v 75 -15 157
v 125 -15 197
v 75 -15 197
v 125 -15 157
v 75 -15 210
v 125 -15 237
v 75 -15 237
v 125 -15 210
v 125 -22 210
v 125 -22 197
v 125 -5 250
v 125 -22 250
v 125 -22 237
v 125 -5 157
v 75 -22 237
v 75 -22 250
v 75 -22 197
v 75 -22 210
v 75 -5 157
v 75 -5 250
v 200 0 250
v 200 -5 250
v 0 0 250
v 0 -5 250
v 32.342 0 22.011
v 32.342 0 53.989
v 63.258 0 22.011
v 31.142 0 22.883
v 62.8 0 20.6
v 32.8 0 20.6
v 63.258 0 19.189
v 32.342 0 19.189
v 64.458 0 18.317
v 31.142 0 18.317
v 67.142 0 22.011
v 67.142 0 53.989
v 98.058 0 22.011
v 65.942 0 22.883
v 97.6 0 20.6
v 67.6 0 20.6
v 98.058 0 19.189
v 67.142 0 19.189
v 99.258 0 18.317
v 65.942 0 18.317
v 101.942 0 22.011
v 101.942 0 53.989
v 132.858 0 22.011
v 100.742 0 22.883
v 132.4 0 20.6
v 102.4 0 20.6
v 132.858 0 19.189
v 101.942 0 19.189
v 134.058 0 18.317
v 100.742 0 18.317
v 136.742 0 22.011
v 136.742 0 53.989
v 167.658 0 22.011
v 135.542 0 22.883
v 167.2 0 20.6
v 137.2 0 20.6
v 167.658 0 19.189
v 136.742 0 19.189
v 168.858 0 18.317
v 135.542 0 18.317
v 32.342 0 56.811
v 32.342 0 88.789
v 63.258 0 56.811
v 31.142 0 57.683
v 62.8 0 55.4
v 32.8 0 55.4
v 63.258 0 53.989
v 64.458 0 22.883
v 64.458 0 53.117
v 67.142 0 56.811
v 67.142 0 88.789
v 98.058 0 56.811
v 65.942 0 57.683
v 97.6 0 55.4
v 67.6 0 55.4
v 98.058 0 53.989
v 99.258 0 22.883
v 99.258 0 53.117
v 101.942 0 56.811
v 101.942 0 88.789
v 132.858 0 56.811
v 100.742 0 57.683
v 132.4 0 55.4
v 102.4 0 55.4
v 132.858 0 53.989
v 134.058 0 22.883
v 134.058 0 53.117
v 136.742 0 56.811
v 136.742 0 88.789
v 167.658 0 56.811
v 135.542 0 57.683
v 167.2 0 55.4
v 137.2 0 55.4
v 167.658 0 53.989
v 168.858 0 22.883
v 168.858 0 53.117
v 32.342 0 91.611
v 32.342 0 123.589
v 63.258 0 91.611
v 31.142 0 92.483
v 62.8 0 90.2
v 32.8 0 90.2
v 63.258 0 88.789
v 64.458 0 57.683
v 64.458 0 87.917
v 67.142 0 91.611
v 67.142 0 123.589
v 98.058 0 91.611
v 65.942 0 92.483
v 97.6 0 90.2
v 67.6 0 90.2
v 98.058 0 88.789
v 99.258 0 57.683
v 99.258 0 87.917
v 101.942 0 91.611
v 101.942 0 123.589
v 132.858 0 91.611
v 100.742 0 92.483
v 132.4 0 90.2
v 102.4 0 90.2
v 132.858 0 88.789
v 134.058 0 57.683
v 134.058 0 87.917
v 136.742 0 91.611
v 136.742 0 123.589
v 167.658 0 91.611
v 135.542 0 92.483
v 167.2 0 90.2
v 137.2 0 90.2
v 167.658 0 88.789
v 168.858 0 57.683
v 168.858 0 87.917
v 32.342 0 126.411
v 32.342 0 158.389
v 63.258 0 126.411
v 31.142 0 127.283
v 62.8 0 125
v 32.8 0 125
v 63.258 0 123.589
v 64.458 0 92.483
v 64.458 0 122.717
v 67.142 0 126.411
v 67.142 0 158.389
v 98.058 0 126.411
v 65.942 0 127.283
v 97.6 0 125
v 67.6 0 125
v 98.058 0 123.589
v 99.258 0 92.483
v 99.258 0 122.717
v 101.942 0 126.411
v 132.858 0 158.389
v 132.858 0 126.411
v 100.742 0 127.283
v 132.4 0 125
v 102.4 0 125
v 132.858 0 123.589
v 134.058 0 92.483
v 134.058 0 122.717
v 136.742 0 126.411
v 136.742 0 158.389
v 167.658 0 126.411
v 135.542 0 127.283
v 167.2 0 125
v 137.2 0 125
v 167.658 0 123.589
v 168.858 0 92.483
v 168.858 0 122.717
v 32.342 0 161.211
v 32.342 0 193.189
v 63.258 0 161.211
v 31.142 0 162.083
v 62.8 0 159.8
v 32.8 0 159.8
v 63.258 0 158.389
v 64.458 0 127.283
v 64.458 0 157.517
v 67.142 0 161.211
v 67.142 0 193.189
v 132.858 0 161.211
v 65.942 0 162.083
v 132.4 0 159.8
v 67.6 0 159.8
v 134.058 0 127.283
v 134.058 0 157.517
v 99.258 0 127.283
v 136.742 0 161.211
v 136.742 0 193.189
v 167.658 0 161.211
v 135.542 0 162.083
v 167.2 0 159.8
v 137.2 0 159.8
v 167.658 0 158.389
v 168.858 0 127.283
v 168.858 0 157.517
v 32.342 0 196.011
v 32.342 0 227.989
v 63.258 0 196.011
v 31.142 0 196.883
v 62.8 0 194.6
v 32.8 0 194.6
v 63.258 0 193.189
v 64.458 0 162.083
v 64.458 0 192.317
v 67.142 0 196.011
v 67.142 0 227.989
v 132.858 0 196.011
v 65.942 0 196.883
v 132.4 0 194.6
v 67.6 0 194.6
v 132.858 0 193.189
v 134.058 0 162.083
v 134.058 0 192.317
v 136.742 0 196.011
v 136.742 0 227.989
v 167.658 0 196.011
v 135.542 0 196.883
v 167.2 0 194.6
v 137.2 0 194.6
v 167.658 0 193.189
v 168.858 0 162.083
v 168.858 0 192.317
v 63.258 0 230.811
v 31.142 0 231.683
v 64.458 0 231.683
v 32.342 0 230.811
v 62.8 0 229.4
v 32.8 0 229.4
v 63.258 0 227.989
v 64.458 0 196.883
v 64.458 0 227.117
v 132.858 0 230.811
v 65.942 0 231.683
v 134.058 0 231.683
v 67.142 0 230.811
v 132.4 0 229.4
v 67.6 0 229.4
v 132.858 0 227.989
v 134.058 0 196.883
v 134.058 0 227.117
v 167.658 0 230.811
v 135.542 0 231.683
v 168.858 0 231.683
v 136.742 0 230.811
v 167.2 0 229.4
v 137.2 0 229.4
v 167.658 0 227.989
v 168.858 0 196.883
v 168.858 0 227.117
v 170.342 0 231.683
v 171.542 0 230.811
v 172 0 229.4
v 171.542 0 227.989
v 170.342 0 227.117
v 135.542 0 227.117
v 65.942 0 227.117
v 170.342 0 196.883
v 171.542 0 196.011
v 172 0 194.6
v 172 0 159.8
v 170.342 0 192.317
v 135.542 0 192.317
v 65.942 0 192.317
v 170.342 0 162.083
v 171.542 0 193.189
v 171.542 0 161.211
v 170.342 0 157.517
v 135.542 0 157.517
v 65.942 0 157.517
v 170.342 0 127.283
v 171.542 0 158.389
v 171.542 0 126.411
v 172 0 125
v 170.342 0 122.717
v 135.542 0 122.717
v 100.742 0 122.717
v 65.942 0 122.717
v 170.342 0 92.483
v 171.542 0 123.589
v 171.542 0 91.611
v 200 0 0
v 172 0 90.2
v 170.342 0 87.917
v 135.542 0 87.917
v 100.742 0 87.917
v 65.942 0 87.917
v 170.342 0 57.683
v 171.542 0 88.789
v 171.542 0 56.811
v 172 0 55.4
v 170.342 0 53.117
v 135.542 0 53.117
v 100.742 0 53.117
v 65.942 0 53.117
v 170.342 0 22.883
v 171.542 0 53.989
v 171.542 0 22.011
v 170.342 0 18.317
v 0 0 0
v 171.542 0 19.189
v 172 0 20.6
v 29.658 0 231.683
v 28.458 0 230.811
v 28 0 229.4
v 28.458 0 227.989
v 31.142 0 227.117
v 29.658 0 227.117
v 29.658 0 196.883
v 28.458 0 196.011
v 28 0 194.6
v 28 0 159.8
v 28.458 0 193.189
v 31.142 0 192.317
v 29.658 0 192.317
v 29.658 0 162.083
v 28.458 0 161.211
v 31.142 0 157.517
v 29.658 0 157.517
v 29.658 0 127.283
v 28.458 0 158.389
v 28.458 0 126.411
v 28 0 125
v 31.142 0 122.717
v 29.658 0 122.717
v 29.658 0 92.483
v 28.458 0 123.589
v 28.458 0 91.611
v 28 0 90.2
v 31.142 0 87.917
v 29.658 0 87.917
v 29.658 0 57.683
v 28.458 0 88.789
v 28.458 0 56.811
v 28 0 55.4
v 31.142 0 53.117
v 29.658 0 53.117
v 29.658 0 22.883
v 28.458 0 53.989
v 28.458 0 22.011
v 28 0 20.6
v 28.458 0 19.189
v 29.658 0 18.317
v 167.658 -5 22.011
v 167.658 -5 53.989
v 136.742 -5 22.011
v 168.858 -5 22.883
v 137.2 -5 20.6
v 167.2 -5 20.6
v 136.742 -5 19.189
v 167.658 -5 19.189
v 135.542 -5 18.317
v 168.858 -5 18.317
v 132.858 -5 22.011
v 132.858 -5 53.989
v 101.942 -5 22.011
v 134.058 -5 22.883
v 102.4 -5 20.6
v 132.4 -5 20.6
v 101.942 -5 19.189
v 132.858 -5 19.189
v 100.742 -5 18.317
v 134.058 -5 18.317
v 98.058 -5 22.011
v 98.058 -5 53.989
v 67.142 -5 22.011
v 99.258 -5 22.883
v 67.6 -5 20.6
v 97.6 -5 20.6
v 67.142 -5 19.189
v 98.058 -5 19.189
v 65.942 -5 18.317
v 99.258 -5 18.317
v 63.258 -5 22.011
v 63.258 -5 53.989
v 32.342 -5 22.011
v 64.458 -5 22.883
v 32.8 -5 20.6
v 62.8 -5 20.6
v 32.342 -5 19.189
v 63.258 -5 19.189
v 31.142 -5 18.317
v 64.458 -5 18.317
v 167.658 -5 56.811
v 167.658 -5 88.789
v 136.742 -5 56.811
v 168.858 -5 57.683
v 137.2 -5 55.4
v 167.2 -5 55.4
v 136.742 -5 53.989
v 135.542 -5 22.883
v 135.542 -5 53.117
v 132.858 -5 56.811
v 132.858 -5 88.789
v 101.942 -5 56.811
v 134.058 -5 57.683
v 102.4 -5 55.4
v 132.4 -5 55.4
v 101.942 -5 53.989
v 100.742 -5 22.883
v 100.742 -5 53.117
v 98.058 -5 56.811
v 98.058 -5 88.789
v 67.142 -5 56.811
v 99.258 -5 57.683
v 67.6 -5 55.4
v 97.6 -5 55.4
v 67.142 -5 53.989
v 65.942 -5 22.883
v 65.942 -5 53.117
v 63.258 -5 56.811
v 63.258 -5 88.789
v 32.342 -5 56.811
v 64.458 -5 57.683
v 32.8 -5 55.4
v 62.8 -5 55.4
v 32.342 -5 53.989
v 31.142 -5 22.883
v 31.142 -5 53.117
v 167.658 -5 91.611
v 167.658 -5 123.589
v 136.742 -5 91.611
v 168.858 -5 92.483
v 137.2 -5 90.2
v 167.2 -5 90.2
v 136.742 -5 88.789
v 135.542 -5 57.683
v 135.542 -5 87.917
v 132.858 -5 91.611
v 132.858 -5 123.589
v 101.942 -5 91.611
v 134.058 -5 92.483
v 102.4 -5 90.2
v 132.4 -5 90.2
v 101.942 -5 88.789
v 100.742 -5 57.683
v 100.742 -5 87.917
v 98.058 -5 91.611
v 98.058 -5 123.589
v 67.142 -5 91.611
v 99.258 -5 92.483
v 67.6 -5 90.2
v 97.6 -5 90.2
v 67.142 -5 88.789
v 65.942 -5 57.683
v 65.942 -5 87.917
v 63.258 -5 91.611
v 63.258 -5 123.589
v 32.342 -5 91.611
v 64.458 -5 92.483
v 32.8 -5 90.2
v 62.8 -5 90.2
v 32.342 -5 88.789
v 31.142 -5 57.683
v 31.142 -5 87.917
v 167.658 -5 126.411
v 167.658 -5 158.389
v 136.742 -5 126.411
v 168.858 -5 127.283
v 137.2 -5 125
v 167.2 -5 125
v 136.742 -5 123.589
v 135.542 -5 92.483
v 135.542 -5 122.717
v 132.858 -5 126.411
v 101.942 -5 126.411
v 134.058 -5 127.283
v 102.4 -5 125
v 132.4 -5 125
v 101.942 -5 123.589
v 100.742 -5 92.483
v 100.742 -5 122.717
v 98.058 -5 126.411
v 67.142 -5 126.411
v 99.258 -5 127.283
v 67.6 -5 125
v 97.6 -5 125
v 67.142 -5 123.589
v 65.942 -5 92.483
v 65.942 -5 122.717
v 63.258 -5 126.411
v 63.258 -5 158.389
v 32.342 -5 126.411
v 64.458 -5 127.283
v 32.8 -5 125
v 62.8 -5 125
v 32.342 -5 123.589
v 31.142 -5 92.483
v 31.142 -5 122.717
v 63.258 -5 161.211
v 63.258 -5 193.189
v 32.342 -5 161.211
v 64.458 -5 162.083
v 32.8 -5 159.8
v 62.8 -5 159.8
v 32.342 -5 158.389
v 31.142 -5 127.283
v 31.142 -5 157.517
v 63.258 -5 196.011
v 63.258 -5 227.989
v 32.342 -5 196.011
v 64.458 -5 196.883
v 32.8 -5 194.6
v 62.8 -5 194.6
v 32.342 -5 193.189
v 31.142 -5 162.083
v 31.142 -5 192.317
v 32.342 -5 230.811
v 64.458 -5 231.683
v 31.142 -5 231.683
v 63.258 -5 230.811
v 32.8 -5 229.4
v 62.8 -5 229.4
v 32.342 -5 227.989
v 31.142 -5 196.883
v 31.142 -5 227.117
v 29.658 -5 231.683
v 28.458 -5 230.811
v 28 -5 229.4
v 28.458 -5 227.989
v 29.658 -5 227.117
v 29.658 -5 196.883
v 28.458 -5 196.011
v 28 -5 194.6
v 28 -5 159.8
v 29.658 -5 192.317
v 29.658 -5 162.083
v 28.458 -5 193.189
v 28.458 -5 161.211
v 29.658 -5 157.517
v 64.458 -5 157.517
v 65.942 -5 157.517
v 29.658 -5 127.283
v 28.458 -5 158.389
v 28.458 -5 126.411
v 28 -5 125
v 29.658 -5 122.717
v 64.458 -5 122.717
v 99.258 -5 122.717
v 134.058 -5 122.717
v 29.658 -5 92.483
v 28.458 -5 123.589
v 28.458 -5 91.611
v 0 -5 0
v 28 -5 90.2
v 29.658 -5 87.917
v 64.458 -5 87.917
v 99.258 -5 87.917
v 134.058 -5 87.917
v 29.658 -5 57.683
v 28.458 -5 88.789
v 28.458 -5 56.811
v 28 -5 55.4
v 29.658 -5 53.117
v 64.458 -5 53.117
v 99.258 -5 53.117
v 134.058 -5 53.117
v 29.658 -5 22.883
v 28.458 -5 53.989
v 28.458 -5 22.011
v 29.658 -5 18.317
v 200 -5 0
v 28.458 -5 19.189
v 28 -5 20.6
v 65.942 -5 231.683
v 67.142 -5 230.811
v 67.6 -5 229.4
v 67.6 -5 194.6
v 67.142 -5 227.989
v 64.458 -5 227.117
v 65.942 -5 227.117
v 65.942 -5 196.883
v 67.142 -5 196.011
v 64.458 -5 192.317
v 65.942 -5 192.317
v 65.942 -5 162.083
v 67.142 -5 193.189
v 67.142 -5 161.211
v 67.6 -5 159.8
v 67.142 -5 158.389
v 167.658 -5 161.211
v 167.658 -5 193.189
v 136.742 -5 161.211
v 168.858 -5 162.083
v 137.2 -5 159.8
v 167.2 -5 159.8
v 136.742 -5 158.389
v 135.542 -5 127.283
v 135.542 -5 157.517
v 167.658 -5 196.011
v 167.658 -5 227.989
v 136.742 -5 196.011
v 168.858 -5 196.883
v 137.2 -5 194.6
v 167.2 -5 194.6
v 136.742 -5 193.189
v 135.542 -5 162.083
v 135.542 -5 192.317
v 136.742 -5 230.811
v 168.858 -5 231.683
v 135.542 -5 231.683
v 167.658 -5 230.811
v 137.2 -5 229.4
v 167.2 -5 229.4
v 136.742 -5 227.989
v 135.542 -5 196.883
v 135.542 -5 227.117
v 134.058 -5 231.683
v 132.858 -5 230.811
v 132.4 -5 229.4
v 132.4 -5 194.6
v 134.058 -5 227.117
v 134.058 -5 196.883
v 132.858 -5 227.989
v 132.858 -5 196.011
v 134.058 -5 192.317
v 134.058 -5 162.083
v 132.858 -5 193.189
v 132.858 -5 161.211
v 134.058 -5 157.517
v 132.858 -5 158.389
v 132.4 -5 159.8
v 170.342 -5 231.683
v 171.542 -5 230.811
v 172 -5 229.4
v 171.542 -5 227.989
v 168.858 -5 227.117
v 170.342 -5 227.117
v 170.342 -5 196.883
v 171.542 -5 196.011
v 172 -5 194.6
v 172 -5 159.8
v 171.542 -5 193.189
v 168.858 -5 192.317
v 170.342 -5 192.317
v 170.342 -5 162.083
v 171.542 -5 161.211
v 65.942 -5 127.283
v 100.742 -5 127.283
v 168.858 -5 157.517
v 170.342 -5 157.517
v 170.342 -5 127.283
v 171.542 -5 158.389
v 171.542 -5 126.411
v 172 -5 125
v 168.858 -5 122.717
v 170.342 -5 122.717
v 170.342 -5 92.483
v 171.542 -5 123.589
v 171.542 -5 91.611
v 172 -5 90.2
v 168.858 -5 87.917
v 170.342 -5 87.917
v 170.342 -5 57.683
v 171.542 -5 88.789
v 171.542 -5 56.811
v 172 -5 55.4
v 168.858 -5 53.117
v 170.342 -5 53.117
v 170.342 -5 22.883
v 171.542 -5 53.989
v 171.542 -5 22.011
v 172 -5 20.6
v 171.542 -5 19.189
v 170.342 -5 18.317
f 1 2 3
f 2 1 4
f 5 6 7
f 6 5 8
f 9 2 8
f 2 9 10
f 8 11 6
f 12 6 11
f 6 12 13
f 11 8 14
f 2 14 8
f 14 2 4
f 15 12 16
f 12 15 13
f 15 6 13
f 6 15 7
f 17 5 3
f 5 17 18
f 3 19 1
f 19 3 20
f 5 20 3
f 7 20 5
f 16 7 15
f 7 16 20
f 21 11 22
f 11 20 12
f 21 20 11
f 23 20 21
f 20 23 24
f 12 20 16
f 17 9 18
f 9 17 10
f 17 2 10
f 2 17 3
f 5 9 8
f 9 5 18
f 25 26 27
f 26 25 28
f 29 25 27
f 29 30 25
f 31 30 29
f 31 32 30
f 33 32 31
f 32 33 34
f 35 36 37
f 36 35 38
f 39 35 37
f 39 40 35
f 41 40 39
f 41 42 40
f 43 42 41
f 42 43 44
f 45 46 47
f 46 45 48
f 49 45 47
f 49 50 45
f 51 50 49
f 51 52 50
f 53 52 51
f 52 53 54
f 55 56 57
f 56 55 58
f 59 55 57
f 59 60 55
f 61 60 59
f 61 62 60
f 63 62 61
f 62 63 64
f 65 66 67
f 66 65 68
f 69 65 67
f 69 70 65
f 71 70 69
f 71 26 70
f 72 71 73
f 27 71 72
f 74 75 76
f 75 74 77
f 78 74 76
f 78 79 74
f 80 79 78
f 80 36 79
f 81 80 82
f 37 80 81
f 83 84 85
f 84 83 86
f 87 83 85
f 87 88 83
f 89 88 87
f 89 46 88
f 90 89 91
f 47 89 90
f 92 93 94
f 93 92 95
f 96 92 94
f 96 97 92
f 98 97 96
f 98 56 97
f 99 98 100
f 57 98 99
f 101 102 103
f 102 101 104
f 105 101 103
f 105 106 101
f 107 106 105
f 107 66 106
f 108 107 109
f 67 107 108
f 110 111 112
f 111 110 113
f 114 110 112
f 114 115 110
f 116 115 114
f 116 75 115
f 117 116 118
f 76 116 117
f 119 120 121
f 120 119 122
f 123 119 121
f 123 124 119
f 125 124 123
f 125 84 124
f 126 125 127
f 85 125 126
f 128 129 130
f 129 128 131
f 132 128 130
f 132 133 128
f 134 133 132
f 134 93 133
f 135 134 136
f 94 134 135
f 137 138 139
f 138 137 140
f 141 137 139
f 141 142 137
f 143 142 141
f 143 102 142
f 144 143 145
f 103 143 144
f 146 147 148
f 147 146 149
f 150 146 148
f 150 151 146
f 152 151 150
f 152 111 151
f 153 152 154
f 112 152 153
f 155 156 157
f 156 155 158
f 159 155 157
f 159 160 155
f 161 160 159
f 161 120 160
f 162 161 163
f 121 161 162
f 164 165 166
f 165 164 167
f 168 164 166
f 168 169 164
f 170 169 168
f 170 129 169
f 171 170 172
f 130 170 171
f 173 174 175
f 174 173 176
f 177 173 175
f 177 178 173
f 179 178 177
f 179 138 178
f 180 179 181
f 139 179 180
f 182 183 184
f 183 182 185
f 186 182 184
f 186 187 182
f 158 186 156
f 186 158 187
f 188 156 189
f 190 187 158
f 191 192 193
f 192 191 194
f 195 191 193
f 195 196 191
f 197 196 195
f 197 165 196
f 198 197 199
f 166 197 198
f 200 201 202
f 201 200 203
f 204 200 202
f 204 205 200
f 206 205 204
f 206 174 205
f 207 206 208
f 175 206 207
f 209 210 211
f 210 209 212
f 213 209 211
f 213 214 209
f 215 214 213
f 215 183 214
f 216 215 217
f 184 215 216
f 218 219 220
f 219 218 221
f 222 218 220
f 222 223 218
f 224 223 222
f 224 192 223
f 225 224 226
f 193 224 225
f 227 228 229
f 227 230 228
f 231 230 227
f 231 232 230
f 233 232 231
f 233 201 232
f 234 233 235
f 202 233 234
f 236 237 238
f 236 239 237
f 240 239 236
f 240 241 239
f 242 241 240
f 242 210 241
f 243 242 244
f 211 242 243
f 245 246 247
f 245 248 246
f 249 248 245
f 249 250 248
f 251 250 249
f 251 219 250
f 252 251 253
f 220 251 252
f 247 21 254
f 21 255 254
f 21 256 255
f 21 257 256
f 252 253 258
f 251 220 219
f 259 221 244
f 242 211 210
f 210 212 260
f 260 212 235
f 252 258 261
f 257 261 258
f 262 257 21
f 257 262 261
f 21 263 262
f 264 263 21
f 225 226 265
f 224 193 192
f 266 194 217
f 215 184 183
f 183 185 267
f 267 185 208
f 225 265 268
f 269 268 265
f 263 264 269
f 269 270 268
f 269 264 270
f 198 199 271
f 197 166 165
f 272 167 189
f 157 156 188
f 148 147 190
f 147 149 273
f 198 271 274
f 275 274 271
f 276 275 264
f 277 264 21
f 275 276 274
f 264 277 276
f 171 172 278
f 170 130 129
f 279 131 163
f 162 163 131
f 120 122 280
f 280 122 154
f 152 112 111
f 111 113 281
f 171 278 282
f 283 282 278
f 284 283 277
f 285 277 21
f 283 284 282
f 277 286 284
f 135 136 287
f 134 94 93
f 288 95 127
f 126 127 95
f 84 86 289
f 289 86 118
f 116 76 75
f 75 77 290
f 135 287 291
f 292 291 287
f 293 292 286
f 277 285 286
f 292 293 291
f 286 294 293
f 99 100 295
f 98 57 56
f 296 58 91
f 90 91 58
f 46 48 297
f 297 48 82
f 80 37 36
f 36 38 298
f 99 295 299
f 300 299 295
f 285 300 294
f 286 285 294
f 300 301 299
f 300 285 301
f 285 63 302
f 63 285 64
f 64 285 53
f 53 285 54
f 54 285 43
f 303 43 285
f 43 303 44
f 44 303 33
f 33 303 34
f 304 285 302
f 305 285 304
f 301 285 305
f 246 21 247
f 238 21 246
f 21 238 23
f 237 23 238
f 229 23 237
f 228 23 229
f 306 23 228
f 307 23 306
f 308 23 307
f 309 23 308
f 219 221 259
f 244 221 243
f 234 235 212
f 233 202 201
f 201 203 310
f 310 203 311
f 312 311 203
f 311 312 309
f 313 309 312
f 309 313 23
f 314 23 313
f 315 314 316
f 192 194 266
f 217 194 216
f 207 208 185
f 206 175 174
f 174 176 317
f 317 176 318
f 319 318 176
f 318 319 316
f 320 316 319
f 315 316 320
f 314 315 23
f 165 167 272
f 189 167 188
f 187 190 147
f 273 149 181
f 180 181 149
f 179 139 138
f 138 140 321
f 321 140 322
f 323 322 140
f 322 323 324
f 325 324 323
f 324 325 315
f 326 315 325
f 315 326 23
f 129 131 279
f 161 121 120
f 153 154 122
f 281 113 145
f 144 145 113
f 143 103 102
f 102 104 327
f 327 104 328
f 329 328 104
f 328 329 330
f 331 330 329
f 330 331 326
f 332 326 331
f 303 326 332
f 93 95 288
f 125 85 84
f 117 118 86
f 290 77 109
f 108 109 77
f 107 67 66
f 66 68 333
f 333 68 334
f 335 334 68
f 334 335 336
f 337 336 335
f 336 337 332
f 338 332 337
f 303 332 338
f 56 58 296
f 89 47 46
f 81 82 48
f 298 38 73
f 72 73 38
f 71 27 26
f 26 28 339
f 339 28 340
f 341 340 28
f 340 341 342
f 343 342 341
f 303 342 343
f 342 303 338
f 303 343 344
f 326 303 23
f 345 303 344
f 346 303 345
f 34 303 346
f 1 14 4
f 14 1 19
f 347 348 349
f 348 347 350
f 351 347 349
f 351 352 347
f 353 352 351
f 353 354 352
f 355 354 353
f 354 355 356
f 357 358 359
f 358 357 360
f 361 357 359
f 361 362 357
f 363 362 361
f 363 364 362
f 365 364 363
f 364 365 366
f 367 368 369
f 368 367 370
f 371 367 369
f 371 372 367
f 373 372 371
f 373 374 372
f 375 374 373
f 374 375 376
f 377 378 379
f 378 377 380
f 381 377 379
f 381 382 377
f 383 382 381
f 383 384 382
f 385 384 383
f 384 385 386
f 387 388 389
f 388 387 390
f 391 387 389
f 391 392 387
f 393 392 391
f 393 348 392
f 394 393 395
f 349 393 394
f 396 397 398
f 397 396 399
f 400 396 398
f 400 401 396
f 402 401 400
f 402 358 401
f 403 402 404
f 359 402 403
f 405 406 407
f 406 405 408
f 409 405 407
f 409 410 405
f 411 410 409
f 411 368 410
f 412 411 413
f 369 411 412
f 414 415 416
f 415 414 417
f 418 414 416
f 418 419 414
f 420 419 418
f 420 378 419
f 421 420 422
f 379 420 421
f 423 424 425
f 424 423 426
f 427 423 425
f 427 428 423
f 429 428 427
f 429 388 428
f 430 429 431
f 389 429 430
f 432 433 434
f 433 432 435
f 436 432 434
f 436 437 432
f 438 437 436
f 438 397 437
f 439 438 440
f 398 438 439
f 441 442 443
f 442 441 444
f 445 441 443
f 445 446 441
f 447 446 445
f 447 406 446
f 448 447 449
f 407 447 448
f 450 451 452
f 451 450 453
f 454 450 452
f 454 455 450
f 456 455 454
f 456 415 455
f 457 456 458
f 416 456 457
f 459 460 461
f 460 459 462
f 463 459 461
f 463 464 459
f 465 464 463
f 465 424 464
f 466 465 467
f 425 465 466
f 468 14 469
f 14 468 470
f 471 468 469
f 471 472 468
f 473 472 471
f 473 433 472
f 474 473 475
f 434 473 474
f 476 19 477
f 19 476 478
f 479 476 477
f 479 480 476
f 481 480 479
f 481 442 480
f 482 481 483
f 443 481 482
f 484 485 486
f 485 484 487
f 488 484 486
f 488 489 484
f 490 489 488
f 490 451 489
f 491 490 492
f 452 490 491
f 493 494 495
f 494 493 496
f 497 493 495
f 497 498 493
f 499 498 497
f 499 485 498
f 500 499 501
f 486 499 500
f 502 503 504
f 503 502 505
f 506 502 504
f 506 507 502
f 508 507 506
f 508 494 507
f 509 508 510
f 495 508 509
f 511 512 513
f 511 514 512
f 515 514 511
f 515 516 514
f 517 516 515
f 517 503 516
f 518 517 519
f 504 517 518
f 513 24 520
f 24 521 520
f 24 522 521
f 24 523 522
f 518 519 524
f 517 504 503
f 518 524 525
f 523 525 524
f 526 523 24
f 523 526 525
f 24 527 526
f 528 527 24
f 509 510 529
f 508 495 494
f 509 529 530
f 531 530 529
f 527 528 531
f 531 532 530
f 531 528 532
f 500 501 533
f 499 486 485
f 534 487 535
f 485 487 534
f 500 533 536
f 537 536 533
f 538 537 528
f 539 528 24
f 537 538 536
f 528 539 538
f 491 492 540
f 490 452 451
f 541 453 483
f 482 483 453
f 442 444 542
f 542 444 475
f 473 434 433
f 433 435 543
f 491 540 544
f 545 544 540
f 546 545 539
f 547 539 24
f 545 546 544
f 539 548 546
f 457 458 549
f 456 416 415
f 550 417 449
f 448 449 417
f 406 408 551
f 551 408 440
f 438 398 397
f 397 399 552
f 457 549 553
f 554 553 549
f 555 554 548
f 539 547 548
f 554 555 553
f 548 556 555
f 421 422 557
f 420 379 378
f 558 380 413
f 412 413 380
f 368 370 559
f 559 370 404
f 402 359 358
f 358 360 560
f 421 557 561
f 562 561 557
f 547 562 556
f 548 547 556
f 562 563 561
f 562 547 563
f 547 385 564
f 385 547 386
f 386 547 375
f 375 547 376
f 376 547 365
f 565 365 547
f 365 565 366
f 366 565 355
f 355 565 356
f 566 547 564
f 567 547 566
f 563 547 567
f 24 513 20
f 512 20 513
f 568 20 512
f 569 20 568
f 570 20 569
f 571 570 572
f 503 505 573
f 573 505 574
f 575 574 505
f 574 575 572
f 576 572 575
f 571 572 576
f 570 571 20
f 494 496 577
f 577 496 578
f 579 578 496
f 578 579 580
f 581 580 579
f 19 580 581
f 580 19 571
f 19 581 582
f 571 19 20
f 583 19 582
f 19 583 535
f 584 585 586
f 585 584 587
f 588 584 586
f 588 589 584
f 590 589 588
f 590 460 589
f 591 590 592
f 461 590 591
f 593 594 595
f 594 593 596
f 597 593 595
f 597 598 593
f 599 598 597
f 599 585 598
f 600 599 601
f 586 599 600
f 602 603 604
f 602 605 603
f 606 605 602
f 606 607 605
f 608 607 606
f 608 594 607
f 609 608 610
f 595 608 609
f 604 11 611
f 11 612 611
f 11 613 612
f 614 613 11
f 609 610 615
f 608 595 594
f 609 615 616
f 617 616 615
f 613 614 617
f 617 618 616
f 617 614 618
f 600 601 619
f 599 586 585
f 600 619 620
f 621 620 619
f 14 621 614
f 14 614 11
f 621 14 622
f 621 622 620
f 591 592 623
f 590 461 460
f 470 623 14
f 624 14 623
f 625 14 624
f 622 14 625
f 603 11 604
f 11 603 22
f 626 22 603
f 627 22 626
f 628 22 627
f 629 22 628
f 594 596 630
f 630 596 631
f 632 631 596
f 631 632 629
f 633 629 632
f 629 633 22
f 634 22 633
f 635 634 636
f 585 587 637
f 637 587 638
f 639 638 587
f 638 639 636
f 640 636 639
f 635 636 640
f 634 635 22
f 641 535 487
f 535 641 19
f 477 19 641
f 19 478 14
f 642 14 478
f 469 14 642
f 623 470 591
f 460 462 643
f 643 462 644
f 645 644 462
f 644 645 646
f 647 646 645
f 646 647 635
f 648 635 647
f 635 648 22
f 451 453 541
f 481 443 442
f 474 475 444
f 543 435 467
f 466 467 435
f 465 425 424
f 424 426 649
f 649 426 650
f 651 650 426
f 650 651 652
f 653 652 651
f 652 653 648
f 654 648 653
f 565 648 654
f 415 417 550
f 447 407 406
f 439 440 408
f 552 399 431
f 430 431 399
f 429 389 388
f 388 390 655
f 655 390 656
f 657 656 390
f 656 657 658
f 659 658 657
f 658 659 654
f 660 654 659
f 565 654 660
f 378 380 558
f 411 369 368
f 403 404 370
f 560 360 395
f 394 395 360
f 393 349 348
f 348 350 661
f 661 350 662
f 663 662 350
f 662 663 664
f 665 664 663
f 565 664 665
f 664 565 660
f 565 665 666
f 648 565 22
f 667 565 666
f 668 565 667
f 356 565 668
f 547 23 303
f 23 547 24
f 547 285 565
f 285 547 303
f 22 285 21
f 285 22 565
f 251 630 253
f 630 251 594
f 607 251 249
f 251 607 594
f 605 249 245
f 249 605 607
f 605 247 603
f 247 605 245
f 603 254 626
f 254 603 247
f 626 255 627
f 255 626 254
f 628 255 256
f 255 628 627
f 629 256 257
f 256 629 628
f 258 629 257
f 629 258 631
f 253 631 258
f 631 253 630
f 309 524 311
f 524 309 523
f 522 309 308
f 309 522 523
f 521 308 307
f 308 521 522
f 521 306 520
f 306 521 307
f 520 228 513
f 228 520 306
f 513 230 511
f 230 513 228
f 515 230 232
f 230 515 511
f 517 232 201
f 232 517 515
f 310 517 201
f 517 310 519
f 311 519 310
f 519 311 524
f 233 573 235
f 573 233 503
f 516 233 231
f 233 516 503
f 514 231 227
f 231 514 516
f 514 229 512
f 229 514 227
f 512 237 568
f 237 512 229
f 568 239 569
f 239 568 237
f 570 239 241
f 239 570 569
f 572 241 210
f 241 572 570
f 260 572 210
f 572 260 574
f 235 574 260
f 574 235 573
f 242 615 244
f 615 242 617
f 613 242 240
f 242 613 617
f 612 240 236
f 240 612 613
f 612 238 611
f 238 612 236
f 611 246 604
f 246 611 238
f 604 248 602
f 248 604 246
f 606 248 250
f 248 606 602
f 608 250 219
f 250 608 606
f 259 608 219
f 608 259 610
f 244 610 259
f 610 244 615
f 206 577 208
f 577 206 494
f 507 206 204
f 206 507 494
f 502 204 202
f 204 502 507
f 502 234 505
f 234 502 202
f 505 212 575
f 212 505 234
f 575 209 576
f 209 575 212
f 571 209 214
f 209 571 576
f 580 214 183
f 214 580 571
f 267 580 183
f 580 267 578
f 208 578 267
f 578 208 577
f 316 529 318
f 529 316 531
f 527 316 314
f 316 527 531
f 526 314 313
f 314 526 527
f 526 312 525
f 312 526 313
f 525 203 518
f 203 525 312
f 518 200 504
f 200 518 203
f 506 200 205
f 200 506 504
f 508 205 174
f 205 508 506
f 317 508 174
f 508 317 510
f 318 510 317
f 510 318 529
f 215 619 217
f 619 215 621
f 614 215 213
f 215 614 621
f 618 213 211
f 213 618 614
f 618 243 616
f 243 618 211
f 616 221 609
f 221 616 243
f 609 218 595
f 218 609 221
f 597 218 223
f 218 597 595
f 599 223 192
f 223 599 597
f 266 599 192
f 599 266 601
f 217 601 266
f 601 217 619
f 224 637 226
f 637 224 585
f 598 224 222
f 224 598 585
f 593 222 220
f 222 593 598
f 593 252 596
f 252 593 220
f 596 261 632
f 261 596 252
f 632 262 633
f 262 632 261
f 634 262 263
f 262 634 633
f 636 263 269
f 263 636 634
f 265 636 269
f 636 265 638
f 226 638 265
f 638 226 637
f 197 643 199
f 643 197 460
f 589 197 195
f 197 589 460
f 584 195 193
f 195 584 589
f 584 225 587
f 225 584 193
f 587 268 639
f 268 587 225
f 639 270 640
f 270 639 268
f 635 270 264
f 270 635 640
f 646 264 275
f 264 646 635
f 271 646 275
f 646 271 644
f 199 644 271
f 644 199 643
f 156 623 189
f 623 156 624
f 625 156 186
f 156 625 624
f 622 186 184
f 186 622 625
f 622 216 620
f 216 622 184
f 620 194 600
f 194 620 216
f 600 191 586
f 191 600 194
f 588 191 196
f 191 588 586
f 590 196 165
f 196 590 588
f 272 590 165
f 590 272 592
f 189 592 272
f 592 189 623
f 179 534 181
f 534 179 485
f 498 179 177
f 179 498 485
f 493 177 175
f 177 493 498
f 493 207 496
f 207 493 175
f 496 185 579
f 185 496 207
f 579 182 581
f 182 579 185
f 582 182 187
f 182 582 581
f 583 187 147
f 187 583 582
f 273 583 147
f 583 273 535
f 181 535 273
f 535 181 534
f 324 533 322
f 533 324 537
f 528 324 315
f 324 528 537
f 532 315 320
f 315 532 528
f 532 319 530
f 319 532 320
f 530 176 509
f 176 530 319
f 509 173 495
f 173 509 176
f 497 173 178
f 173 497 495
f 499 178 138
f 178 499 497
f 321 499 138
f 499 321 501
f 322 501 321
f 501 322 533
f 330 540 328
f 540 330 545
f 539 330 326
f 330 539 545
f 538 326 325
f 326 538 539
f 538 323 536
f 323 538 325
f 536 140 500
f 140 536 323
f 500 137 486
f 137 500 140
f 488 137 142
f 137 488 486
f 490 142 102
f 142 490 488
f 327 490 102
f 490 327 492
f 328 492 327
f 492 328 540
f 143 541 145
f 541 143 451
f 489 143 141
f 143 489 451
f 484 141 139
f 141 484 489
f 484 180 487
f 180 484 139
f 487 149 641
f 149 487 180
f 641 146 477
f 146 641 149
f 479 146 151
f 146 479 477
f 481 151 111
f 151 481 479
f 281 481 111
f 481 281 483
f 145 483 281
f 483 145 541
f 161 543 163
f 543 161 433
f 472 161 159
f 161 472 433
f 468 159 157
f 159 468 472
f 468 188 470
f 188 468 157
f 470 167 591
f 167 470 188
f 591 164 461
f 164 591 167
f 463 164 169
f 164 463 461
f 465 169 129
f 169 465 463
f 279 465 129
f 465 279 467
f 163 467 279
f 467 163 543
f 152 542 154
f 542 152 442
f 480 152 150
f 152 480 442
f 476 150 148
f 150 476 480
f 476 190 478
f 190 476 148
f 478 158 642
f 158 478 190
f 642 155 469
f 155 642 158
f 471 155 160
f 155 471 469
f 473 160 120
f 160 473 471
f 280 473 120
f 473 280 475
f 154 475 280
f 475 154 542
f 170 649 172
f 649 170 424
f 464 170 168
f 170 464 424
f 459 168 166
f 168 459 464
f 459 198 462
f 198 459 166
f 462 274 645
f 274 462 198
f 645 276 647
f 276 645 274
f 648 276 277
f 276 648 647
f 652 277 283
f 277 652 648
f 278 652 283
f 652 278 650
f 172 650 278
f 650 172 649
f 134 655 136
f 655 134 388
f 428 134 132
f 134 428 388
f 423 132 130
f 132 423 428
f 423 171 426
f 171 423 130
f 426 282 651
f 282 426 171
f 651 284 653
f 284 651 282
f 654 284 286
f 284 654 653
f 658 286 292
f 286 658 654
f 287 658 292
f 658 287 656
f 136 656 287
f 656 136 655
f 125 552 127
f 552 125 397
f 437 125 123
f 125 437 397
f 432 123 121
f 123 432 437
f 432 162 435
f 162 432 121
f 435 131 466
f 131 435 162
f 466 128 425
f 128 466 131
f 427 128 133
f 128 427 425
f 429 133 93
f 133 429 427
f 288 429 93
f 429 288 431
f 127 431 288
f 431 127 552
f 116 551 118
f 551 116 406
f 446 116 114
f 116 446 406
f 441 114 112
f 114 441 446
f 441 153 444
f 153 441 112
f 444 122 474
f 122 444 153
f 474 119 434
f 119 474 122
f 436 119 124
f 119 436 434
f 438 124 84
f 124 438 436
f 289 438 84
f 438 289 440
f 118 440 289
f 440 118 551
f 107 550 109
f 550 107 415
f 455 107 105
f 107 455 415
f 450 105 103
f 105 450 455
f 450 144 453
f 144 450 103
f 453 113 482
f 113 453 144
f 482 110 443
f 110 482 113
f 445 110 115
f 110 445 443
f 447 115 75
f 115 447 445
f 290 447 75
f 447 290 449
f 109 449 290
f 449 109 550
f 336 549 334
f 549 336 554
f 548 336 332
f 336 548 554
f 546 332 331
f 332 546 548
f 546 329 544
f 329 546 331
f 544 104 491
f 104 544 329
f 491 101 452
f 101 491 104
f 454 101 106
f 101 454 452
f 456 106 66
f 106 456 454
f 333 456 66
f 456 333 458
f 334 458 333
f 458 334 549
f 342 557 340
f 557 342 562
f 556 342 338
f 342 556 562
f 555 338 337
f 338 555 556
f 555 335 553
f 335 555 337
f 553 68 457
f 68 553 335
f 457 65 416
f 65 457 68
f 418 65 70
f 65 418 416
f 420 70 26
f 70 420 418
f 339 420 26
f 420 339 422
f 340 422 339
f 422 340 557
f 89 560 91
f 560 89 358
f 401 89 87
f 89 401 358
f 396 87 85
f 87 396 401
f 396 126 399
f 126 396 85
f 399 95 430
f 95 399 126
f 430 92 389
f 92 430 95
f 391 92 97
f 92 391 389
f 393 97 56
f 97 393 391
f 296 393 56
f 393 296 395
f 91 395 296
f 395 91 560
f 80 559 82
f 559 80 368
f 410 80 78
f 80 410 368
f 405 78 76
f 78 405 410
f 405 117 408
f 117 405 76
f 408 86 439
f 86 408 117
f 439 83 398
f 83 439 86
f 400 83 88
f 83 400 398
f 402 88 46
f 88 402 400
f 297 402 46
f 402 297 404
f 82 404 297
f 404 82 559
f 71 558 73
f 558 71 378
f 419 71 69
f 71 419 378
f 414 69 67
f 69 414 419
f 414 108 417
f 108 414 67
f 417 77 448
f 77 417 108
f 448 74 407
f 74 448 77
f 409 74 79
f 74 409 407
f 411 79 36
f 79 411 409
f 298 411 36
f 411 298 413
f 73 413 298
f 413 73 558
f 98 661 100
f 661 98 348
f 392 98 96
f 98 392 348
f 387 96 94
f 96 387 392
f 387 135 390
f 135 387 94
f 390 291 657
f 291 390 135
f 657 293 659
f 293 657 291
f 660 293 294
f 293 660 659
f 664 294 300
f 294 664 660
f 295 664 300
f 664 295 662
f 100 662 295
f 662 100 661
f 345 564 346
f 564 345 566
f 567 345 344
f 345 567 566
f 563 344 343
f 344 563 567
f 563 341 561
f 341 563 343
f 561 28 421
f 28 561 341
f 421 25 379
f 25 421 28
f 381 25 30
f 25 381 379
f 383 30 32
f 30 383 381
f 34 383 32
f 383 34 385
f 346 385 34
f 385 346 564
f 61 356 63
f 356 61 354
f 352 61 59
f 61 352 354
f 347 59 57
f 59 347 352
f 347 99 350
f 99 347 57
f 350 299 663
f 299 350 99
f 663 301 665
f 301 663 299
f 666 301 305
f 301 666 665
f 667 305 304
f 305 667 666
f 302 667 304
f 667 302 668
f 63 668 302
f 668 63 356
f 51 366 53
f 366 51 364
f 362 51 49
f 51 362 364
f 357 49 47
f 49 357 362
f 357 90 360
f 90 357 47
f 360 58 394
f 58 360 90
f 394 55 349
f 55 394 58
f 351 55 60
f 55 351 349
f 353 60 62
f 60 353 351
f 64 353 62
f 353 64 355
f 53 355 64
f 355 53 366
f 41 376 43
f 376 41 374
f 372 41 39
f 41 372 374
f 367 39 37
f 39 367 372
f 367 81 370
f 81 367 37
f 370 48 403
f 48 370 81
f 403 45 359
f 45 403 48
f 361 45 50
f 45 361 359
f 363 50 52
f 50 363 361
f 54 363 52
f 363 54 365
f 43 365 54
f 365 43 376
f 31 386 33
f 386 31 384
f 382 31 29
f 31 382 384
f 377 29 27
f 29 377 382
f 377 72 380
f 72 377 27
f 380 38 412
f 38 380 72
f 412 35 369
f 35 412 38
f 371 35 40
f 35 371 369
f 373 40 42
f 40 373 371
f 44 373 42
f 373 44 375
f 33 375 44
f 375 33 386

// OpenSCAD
// file: ../Library/GeneralBracket.scad
HOLE_HEIGHT = 13;
HOLE_THICKNESS = 7;
WOOD_SLAB_HEIGHT = 27;

function BracketHeight(number_of_bracket) = ((HOLE_HEIGHT + WOOD_SLAB_HEIGHT)*(number_of_bracket))+ HOLE_HEIGHT;

module GeneralBracket(number_of_bracket, width, thickness)
{
    height = BracketHeight(number_of_bracket);
    
    linear_extrude(thickness)
    square([width,height]);
    
    for(i = [0:number_of_bracket-1])
        translate([0,(HOLE_HEIGHT + WOOD_SLAB_HEIGHT)*i, thickness])
        linear_extrude(HOLE_THICKNESS)
        square([width, HOLE_HEIGHT]);
}
// main file
include <../Library/GeneralBracket.scad>

GENERAL_THICKNESS = 5;
BRACKETS_WIDTH = 50;
NUMBER_OF_BRACKET = 2;
PEG_BOARD_WIDTH = 200;
PEG_BOARD_Z = 250;
PEG_BOARD_HOLE_DIAMETER = 4.8;
PEG_BOARD_HOLE_SPACING = 30;
PEG_BOARD_CIRCLE_DEFINITION = 10;

union()
{
    translate([(BRACKETS_WIDTH/2)+(PEG_BOARD_WIDTH/2), 0, PEG_BOARD_Z])
    rotate([90,180,0])
    GeneralBracket(NUMBER_OF_BRACKET, BRACKETS_WIDTH, GENERAL_THICKNESS*3);
    rotate([90,0,0])
    PegBoard(PEG_BOARD_WIDTH,PEG_BOARD_Z,PEG_BOARD_HOLE_DIAMETER,PEG_BOARD_HOLE_SPACING,PEG_BOARD_CIRCLE_DEFINITION,GENERAL_THICKNESS);
}

module PegBoard(width, height, hole_diameter, hole_spacing, circle_definition, thickness)
{
    hole_dim = hole_diameter + hole_spacing;
    number_hole_height = floor(height / hole_dim)-1;
    number_hole_width = floor(width / hole_dim)-1;
    
    hole_height = (number_hole_height*hole_dim);
    hole_width = (number_hole_width*hole_dim);
    
    hole_height_offset = (height - hole_height)/2;
    hole_width_offset = (width - hole_width)/2;
    
    linear_extrude(thickness)
    difference()
    {
        square([width,height]);
        for(hole_y = [0:number_hole_height])
        {
            for(hole_x = [0:number_hole_width])
            {
                translate([hole_width_offset+(hole_dim*hole_x), hole_height_offset+(hole_dim*hole_y)])
                circle(d=hole_diameter, $fn=circle_definition);
            }
        }
    }
    
    
}
